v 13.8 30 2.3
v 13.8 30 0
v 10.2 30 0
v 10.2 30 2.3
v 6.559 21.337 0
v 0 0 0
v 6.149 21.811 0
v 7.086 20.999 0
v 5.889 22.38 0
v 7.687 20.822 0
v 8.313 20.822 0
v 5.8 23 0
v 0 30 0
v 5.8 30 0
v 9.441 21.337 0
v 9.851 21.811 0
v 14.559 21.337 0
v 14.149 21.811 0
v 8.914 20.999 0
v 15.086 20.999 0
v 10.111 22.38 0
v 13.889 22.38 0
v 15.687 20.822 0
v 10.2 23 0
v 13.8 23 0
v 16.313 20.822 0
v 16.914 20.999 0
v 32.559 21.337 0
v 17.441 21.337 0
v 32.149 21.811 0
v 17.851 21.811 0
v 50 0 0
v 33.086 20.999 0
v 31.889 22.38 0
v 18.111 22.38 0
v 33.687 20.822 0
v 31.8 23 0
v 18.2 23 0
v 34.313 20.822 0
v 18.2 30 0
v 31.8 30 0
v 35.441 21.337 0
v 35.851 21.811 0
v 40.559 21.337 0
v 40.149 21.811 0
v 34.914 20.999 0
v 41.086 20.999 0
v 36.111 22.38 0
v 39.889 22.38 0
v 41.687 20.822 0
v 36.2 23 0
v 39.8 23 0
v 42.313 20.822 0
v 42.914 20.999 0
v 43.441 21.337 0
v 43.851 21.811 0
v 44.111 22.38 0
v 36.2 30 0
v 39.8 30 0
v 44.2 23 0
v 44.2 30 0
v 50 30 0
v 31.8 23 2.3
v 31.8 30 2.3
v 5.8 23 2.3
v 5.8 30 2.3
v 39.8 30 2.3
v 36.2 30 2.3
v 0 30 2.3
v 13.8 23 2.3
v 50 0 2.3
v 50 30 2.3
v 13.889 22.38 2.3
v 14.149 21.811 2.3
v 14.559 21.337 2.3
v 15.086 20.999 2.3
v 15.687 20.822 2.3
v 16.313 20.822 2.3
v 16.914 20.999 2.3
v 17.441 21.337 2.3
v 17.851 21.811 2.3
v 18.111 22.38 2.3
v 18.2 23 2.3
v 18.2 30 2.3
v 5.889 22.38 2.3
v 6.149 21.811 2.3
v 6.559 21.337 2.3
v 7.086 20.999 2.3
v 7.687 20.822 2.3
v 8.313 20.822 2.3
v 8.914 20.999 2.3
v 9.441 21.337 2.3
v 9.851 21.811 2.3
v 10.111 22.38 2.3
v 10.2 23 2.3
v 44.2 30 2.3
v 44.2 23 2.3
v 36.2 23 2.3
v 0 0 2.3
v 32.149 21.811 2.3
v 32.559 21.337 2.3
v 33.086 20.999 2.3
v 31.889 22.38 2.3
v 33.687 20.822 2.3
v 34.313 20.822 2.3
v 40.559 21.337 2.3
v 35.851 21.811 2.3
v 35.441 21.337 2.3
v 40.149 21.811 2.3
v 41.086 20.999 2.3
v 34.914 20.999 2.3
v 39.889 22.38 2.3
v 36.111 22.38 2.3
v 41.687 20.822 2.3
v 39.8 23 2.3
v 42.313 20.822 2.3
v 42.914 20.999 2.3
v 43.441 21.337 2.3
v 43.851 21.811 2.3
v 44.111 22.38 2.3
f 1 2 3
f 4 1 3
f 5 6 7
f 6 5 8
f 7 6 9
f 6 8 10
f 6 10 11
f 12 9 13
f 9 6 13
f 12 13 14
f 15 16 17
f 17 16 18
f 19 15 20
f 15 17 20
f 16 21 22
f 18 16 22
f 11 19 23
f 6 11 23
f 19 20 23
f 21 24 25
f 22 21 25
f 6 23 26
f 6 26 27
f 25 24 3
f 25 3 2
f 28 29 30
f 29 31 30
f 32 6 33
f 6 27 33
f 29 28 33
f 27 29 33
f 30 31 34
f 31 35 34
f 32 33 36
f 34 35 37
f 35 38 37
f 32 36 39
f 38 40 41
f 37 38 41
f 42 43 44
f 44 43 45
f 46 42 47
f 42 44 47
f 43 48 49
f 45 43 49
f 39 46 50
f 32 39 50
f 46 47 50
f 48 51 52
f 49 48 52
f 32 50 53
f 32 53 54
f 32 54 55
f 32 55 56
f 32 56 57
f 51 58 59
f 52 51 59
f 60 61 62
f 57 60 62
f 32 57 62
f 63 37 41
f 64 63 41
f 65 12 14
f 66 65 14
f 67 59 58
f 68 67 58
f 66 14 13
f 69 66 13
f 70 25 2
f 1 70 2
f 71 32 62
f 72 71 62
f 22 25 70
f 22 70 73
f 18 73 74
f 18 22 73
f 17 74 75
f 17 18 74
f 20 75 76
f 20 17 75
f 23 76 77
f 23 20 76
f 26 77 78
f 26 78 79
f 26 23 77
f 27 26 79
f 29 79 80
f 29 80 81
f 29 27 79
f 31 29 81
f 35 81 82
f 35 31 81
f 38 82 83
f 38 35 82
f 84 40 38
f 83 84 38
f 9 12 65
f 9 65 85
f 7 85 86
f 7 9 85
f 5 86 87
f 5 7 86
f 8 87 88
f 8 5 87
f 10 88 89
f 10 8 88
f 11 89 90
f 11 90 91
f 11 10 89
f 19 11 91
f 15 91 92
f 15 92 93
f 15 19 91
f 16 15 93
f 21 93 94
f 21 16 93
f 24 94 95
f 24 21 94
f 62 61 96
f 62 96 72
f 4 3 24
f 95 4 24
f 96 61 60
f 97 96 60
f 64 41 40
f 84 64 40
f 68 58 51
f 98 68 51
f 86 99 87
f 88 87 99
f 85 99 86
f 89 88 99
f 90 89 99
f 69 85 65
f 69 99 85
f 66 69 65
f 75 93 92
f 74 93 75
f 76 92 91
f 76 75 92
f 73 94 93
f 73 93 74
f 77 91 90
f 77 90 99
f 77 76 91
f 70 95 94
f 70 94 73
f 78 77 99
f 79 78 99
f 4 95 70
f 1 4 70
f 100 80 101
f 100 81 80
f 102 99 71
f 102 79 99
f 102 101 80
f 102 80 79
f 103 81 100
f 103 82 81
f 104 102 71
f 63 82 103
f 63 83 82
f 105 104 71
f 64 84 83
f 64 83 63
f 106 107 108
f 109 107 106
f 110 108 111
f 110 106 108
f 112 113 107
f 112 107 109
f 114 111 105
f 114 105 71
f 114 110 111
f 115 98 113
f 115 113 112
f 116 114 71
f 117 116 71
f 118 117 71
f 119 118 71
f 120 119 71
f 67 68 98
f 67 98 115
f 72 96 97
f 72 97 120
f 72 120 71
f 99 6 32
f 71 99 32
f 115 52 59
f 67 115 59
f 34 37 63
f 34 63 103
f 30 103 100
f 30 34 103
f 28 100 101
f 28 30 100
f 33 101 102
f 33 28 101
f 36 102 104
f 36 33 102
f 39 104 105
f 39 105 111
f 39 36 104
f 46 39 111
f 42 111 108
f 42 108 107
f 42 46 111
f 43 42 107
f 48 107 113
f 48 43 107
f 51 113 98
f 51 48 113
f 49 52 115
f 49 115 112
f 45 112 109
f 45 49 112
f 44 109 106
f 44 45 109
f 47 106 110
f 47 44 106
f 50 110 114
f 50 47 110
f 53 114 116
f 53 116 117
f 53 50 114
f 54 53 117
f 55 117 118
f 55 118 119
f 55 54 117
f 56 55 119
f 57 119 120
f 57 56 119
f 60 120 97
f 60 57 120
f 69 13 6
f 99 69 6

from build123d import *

# Parameters (mm, degrees)
PAD_DEPTH = 2.3


with BuildPart() as part:
    # Sketch → Pad (new body)
    with BuildSketch(Plane.XY):
        with BuildLine():
            Line((0, 0), (50, 0))
            Line((50, 0), (50, 30))
            Line((44.2, 30), (50, 30))
            Line((44.2, 30), (44.2, 23))
            ThreePointArc((39.8, 23), (42, 20.8), (44.2, 23))
            Line((39.8, 23), (39.8, 30))
            Line((39.8, 30), (36.2, 30))
            Line((36.2, 30), (36.2, 23))
            ThreePointArc((31.8, 23), (34, 20.8), (36.2, 23))
            Line((31.8, 23), (31.8, 30))
            Line((31.8, 30), (18.2, 30))
            Line((18.2, 30), (18.2, 23))
            ThreePointArc((13.8, 23), (16, 20.8), (18.2, 23))
            Line((13.8, 23), (13.8, 30))
            Line((13.8, 30), (10.2, 30))
            Line((10.2, 30), (10.2, 23))
            ThreePointArc((5.8, 23), (8, 20.8), (10.2, 23))
            Line((5.8, 23), (5.8, 30))
            Line((5.8, 30), (0, 30))
            Line((0, 30), (0, 0))
        make_face()
    extrude(amount=PAD_DEPTH)


solid = part.part
